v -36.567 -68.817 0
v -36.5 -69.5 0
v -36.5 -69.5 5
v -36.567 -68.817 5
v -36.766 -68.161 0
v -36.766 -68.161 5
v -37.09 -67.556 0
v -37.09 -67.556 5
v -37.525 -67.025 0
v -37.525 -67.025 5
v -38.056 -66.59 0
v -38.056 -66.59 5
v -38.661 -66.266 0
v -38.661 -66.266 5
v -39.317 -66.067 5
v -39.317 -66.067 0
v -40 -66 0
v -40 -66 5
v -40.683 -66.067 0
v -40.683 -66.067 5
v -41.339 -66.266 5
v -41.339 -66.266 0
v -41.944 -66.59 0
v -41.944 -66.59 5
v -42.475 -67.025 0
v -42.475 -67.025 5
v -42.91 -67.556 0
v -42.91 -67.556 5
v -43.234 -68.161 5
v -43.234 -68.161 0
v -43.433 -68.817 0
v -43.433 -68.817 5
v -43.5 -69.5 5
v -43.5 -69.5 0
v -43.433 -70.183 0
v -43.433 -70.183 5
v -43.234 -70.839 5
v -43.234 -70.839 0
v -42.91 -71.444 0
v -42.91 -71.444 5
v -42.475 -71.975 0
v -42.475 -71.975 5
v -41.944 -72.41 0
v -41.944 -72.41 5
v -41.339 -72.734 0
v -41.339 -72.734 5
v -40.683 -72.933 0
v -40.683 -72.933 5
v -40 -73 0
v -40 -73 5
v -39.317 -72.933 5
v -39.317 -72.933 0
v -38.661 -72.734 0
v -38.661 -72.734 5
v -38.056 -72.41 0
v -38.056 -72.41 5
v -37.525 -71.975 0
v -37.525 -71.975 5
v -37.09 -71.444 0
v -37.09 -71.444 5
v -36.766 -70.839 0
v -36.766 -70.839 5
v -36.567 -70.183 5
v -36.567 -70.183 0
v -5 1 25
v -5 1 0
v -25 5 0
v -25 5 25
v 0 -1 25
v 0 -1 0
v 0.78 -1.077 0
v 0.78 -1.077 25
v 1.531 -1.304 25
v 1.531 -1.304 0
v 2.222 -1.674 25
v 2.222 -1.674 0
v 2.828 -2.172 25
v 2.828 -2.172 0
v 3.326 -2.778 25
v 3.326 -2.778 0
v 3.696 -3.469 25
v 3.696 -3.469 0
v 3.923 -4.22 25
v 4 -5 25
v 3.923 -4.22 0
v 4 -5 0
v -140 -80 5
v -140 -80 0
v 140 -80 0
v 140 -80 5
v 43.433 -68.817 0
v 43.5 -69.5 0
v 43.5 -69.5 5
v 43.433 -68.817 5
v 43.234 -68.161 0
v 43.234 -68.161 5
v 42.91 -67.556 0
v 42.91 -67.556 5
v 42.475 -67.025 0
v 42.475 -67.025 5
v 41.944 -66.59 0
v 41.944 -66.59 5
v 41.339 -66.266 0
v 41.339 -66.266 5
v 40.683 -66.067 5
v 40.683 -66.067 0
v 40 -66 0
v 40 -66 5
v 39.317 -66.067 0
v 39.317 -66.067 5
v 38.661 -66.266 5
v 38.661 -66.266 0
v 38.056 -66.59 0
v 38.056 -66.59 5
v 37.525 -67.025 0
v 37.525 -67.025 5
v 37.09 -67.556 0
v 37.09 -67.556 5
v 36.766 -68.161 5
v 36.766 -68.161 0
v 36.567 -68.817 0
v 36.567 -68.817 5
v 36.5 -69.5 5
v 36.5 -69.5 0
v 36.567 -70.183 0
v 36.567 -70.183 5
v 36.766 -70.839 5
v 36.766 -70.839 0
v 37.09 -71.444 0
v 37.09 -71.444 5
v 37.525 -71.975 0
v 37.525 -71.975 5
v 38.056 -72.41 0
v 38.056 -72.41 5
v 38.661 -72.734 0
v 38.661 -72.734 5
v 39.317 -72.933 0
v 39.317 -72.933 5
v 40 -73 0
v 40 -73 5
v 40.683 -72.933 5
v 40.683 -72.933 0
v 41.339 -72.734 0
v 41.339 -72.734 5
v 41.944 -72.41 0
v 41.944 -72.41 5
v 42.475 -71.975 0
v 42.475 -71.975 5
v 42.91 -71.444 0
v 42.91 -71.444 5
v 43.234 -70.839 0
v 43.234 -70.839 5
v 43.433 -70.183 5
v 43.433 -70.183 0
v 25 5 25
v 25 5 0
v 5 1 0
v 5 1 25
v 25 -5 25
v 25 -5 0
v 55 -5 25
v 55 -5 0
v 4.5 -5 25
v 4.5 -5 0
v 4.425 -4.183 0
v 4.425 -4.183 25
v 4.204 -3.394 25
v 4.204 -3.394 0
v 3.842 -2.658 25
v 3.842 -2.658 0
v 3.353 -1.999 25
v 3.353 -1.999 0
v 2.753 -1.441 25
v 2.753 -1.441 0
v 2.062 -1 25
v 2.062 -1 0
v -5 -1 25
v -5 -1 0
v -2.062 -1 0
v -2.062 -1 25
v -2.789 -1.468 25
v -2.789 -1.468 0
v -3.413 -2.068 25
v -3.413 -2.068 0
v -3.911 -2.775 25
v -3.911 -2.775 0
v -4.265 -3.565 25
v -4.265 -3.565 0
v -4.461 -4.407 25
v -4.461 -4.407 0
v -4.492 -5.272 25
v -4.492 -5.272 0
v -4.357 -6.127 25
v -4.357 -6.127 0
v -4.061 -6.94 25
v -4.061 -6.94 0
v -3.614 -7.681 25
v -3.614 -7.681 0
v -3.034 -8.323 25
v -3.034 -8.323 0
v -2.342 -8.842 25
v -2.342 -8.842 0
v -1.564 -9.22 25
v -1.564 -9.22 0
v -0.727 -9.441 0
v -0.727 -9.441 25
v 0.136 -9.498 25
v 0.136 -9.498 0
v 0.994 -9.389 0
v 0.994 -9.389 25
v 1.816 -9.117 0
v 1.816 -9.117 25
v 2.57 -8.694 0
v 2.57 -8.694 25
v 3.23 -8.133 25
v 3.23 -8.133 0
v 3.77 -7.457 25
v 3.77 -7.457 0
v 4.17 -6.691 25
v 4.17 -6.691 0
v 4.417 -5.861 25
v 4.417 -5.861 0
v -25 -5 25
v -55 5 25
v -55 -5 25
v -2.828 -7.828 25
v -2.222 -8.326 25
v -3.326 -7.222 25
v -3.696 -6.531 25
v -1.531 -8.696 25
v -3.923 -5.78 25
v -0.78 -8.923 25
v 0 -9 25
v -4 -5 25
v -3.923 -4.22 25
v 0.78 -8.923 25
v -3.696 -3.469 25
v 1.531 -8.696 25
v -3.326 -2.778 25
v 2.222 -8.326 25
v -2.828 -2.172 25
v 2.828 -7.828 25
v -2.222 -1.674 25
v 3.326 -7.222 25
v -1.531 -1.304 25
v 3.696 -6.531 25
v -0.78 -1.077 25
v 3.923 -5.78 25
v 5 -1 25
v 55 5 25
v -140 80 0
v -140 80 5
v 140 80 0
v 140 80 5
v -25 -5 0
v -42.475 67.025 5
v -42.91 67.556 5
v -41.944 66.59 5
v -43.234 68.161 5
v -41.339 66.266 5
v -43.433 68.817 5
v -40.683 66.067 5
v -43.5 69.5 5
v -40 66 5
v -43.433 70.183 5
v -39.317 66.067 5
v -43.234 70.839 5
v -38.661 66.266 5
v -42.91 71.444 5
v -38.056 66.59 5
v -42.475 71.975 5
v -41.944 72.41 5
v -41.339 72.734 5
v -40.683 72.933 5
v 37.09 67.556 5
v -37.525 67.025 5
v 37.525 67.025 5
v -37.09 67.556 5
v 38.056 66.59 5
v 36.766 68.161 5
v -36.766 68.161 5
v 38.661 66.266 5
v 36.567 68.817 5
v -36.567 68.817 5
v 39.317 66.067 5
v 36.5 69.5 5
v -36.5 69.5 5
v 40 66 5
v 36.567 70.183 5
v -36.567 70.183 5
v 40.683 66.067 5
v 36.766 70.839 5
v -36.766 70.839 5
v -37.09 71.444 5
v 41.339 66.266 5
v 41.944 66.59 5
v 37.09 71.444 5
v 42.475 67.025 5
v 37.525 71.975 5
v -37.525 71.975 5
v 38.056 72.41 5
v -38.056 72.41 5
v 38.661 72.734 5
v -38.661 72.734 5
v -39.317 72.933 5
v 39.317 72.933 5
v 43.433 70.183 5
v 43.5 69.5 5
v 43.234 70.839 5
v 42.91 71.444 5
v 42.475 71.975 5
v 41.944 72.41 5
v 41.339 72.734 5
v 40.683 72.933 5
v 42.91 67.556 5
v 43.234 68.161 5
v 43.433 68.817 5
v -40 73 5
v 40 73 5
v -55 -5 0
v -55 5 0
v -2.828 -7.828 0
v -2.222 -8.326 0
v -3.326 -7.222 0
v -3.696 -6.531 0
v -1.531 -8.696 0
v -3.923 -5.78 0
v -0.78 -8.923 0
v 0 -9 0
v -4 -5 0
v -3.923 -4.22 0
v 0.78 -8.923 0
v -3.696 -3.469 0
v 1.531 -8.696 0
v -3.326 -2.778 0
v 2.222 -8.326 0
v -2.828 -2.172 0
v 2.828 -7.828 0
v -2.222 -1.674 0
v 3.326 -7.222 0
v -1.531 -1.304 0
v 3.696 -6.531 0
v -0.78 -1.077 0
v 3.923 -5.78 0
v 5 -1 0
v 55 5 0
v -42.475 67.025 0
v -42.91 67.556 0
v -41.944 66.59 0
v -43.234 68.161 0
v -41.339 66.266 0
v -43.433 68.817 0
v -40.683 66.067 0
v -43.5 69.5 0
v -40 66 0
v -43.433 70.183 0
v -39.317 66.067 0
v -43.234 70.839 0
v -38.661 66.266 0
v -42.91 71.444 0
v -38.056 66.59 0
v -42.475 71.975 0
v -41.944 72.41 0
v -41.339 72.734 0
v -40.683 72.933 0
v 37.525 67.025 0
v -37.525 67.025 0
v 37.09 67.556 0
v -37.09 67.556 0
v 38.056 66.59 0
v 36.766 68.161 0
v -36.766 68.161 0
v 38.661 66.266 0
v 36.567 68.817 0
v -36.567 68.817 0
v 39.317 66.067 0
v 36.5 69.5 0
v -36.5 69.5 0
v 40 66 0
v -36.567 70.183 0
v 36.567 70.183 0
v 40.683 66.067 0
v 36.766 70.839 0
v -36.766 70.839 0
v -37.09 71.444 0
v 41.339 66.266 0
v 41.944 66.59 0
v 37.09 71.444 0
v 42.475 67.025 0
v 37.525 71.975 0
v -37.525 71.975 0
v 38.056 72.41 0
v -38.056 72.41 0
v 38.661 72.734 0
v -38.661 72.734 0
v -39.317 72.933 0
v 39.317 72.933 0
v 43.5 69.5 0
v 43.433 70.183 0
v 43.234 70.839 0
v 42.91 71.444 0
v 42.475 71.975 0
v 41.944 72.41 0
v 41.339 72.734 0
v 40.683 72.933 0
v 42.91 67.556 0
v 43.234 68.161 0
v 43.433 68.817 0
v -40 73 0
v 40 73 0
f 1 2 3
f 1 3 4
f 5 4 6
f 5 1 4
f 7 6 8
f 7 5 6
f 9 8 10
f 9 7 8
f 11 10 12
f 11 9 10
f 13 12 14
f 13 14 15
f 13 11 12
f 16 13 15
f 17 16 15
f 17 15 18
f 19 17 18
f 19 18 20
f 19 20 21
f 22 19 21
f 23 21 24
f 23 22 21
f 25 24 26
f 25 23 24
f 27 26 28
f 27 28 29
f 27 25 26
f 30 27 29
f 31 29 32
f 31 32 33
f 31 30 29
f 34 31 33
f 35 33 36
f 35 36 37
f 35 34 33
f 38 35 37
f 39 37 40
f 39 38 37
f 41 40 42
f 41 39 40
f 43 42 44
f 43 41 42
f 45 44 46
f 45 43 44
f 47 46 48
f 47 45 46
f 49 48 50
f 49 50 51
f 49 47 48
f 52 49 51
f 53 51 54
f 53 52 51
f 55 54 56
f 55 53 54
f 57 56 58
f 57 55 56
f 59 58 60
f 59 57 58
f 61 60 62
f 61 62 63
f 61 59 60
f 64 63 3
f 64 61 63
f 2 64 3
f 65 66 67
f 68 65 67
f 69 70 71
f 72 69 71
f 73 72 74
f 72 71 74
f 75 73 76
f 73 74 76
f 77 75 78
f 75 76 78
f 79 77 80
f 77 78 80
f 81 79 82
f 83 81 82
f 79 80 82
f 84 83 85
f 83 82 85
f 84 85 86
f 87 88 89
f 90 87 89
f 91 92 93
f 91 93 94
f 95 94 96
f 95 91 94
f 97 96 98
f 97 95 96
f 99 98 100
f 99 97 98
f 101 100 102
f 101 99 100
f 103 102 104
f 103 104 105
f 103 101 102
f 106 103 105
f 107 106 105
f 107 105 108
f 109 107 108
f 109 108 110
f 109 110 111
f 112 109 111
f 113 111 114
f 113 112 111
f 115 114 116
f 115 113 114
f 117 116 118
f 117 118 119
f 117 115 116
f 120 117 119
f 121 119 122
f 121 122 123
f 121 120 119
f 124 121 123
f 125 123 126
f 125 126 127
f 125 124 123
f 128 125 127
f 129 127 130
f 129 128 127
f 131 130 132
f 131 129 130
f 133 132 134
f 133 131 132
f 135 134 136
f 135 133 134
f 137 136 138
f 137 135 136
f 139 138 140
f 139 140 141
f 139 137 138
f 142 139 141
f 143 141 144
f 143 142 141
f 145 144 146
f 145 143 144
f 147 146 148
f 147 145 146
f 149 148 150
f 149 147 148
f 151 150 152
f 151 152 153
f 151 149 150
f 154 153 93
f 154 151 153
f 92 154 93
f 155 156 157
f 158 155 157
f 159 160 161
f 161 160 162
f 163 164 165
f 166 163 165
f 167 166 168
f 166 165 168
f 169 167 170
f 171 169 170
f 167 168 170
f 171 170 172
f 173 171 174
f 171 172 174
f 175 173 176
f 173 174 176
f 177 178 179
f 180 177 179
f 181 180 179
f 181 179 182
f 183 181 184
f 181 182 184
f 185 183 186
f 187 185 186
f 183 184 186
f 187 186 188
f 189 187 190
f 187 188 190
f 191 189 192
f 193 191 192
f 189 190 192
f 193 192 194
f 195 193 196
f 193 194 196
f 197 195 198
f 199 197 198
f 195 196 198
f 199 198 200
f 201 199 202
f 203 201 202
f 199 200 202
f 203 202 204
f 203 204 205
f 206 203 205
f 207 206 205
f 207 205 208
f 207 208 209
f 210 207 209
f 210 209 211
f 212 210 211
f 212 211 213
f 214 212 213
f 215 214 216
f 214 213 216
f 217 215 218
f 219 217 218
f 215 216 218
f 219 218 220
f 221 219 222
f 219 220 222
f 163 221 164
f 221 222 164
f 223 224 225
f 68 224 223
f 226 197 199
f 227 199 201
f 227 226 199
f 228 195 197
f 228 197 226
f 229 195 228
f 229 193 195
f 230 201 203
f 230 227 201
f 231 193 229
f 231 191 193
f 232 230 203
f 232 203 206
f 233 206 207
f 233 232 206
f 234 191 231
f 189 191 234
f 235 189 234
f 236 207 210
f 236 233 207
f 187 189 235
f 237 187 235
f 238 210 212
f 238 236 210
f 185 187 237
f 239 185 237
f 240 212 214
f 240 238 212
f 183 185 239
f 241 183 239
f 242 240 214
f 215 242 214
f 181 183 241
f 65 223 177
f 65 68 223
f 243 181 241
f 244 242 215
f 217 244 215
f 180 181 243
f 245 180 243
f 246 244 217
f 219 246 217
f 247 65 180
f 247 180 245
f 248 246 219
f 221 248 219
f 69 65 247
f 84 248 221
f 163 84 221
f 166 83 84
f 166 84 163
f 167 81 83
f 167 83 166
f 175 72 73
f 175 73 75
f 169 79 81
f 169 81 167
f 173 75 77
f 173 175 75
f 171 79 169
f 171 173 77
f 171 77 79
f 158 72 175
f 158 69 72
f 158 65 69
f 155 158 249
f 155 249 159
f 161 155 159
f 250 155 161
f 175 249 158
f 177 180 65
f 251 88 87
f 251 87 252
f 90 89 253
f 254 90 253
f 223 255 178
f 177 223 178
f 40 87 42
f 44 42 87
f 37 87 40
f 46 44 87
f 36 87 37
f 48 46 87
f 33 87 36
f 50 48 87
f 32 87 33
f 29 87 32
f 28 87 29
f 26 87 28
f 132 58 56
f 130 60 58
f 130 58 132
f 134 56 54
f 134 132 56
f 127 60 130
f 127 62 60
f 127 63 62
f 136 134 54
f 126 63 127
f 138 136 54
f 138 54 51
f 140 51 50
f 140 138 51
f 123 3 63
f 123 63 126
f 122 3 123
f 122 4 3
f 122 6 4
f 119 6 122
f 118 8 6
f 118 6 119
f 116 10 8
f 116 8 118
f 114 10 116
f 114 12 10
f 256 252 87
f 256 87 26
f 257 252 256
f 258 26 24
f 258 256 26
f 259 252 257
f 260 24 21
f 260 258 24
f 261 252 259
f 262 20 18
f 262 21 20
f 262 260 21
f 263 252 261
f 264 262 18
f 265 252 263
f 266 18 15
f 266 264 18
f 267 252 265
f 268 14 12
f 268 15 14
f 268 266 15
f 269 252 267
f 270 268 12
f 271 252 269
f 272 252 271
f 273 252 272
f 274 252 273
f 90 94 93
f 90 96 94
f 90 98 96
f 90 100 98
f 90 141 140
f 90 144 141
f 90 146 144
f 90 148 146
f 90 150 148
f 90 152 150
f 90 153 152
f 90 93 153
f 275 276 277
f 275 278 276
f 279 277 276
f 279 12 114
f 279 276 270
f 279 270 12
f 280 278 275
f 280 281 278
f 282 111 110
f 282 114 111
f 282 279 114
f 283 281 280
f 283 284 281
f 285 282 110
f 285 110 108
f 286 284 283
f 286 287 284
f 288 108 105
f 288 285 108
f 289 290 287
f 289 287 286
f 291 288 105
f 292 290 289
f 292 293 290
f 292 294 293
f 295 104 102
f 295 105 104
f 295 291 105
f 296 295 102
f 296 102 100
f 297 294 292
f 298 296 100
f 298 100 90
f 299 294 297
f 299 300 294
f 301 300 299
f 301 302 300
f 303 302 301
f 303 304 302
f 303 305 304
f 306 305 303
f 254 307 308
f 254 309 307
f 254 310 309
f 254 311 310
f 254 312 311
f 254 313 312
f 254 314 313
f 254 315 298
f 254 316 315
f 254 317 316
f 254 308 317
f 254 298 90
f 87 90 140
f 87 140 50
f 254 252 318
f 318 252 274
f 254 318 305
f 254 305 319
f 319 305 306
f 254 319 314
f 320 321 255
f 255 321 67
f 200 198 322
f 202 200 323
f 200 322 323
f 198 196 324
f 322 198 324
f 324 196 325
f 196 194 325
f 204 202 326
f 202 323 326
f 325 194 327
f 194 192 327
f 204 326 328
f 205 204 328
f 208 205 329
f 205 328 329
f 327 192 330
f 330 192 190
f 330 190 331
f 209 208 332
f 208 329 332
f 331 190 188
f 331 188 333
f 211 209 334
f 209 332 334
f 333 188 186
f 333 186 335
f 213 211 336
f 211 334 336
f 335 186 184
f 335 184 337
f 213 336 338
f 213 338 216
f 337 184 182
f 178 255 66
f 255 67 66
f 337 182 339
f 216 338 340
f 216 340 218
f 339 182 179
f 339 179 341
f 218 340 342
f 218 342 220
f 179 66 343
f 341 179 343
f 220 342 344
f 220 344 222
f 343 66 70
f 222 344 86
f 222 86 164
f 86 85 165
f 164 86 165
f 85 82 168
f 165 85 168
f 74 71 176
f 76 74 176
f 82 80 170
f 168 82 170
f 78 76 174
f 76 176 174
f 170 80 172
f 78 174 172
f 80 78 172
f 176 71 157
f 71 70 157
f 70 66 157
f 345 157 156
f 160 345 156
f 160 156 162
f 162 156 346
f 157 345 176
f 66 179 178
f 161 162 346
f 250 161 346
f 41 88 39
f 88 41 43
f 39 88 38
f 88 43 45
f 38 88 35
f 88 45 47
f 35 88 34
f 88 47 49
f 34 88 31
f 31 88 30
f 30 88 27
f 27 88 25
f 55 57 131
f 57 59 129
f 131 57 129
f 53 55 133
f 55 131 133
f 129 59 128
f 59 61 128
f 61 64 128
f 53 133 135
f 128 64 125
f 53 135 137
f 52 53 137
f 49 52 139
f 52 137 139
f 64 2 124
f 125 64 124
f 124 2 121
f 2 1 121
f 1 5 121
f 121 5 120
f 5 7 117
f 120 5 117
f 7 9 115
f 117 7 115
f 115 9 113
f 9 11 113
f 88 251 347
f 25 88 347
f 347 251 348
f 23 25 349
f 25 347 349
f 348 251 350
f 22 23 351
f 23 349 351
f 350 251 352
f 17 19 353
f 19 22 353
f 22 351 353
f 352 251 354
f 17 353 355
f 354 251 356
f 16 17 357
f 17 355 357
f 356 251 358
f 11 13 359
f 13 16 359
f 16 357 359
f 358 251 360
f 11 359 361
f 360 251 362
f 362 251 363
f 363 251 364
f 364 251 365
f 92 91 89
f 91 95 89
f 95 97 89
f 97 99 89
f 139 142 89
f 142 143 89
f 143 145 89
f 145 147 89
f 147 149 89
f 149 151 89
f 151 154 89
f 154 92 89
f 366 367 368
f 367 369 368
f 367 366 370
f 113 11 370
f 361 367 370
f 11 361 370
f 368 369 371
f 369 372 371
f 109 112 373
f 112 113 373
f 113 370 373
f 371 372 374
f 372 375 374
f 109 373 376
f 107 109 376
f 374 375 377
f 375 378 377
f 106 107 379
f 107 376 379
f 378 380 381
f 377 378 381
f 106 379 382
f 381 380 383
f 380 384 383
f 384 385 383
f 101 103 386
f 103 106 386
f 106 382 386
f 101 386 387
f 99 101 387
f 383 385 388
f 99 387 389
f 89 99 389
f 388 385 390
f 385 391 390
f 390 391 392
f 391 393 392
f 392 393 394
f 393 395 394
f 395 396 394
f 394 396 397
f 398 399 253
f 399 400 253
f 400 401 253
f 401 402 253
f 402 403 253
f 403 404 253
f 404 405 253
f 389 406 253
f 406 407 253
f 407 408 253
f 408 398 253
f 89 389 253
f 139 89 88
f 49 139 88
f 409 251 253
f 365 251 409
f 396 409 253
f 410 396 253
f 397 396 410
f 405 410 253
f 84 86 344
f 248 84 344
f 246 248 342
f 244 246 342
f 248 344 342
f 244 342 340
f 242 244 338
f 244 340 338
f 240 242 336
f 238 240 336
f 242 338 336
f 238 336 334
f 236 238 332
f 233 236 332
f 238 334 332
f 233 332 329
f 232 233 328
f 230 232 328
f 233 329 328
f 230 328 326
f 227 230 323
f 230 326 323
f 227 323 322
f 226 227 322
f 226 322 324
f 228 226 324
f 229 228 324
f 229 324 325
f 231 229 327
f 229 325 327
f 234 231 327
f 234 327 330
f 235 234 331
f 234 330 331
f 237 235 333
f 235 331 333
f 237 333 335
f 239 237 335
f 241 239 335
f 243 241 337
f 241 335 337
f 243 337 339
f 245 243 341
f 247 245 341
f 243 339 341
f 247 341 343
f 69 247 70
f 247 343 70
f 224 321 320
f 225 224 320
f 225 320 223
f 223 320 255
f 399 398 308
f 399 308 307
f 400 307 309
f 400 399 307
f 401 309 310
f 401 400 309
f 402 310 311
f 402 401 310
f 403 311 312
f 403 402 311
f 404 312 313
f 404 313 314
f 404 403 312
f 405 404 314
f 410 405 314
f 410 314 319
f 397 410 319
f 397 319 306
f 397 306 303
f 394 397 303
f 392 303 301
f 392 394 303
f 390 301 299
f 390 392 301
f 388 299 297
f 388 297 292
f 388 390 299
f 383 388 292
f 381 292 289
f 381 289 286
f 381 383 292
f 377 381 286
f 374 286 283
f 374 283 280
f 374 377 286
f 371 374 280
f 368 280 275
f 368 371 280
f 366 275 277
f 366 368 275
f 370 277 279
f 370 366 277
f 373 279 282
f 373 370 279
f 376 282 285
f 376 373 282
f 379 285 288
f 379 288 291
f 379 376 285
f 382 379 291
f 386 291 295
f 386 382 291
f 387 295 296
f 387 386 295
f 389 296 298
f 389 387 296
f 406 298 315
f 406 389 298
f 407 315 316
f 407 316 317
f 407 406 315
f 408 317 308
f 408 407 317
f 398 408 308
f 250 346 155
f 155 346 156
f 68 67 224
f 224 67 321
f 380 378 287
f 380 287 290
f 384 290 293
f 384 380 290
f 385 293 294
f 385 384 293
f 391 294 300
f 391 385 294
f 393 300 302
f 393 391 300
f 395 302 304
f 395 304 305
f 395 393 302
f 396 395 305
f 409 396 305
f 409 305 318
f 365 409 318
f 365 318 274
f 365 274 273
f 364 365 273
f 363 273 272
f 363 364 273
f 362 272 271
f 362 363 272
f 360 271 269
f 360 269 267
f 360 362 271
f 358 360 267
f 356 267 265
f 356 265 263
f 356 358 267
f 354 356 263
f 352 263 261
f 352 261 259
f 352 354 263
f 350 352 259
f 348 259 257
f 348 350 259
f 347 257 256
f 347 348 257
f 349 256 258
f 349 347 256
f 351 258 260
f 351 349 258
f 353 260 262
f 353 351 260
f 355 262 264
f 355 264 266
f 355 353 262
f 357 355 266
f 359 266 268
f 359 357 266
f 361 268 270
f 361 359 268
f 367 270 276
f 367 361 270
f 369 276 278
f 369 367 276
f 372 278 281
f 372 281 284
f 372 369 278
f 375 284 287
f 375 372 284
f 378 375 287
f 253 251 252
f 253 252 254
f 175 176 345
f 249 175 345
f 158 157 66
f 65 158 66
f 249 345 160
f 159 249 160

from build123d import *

# Parameters (mm, degrees)
F0_W     = 280
F0_H     = 160
F0_R     = 3.5
F1_DEPTH = 5
F3_DEPTH = 25


with BuildPart() as f1:
    # F0 (on Top) → F1 (new body)
    with BuildSketch(Plane.XY):
        Rectangle(F0_W, F0_H)
        with Locations((-40, -69.5)):
            Circle(F0_R, mode=Mode.SUBTRACT)
        with Locations((40, -69.5)):
            Circle(F0_R, mode=Mode.SUBTRACT)
        with Locations((-40, 69.5)):
            Circle(F0_R, mode=Mode.SUBTRACT)
        with Locations((40, 69.5)):
            Circle(F0_R, mode=Mode.SUBTRACT)
    extrude(amount=F1_DEPTH)


with BuildPart() as f3:
    # F2 (on face) → F3 (new body)
    with BuildSketch(Plane.XY):
        with BuildLine():
            ThreePointArc((0, -0.5), (-1.0606601718, -0.6267860789), (-2.0615528128, -1))
            Line((-2.0615528128, -1), (0, -1))
            Line((0, -1), (0, -0.5))
        make_face()
        with BuildLine():
            Line((0, -1), (2.0615528128, -1))
            ThreePointArc((2.0615528128, -1), (1.0606601718, -0.6267860789), (0, -0.5))
            Line((0, -0.5), (0, -1))
        make_face()
        with BuildLine():
            ThreePointArc((4.5, -5), (3.8423292192, -2.6576707808), (2.0615528128, -1))
            Line((2.0615528128, -1), (0, -1))
            Line((0, -1), (-2.0615528128, -1))
            ThreePointArc((-2.0615528128, -1), (-2.3423292192, -8.8423292192), (4.5, -5))
        make_face()
        with BuildLine():
            ThreePointArc((4, -5), (-2.8284271247, -7.8284271247), (0, -1))
            ThreePointArc((0, -1), (2.8284271247, -2.1715728753), (4, -5))
        make_face(mode=Mode.SUBTRACT)
        with BuildLine():
            Line((5, 1), (0, 1))
            Line((0, 1), (-5, 1))
            Line((-5, 1), (-25, 5))
            Line((-25, 5), (-55, 5))
            Line((-55, 5), (-55, 0))
            Line((-55, 0), (-55, -5))
            Line((-55, -5), (-25, -5))
            Line((-25, -5), (-5, -1))
            Line((-5, -1), (-2.0615528128, -1))
            ThreePointArc((-2.0615528128, -1), (-1.0606601718, -0.6267860789), (0, -0.5))
            ThreePointArc((0, -0.5), (1.0606601718, -0.6267860789), (2.0615528128, -1))
            Line((2.0615528128, -1), (5, -1))
            Line((5, -1), (25, -5))
            Line((25, -5), (55, -5))
            Line((55, -5), (55, 5))
            Line((55, 5), (25, 5))
            Line((25, 5), (5, 1))
        make_face()
    extrude(amount=F3_DEPTH)


solid = Compound([f1.part, f3.part])
